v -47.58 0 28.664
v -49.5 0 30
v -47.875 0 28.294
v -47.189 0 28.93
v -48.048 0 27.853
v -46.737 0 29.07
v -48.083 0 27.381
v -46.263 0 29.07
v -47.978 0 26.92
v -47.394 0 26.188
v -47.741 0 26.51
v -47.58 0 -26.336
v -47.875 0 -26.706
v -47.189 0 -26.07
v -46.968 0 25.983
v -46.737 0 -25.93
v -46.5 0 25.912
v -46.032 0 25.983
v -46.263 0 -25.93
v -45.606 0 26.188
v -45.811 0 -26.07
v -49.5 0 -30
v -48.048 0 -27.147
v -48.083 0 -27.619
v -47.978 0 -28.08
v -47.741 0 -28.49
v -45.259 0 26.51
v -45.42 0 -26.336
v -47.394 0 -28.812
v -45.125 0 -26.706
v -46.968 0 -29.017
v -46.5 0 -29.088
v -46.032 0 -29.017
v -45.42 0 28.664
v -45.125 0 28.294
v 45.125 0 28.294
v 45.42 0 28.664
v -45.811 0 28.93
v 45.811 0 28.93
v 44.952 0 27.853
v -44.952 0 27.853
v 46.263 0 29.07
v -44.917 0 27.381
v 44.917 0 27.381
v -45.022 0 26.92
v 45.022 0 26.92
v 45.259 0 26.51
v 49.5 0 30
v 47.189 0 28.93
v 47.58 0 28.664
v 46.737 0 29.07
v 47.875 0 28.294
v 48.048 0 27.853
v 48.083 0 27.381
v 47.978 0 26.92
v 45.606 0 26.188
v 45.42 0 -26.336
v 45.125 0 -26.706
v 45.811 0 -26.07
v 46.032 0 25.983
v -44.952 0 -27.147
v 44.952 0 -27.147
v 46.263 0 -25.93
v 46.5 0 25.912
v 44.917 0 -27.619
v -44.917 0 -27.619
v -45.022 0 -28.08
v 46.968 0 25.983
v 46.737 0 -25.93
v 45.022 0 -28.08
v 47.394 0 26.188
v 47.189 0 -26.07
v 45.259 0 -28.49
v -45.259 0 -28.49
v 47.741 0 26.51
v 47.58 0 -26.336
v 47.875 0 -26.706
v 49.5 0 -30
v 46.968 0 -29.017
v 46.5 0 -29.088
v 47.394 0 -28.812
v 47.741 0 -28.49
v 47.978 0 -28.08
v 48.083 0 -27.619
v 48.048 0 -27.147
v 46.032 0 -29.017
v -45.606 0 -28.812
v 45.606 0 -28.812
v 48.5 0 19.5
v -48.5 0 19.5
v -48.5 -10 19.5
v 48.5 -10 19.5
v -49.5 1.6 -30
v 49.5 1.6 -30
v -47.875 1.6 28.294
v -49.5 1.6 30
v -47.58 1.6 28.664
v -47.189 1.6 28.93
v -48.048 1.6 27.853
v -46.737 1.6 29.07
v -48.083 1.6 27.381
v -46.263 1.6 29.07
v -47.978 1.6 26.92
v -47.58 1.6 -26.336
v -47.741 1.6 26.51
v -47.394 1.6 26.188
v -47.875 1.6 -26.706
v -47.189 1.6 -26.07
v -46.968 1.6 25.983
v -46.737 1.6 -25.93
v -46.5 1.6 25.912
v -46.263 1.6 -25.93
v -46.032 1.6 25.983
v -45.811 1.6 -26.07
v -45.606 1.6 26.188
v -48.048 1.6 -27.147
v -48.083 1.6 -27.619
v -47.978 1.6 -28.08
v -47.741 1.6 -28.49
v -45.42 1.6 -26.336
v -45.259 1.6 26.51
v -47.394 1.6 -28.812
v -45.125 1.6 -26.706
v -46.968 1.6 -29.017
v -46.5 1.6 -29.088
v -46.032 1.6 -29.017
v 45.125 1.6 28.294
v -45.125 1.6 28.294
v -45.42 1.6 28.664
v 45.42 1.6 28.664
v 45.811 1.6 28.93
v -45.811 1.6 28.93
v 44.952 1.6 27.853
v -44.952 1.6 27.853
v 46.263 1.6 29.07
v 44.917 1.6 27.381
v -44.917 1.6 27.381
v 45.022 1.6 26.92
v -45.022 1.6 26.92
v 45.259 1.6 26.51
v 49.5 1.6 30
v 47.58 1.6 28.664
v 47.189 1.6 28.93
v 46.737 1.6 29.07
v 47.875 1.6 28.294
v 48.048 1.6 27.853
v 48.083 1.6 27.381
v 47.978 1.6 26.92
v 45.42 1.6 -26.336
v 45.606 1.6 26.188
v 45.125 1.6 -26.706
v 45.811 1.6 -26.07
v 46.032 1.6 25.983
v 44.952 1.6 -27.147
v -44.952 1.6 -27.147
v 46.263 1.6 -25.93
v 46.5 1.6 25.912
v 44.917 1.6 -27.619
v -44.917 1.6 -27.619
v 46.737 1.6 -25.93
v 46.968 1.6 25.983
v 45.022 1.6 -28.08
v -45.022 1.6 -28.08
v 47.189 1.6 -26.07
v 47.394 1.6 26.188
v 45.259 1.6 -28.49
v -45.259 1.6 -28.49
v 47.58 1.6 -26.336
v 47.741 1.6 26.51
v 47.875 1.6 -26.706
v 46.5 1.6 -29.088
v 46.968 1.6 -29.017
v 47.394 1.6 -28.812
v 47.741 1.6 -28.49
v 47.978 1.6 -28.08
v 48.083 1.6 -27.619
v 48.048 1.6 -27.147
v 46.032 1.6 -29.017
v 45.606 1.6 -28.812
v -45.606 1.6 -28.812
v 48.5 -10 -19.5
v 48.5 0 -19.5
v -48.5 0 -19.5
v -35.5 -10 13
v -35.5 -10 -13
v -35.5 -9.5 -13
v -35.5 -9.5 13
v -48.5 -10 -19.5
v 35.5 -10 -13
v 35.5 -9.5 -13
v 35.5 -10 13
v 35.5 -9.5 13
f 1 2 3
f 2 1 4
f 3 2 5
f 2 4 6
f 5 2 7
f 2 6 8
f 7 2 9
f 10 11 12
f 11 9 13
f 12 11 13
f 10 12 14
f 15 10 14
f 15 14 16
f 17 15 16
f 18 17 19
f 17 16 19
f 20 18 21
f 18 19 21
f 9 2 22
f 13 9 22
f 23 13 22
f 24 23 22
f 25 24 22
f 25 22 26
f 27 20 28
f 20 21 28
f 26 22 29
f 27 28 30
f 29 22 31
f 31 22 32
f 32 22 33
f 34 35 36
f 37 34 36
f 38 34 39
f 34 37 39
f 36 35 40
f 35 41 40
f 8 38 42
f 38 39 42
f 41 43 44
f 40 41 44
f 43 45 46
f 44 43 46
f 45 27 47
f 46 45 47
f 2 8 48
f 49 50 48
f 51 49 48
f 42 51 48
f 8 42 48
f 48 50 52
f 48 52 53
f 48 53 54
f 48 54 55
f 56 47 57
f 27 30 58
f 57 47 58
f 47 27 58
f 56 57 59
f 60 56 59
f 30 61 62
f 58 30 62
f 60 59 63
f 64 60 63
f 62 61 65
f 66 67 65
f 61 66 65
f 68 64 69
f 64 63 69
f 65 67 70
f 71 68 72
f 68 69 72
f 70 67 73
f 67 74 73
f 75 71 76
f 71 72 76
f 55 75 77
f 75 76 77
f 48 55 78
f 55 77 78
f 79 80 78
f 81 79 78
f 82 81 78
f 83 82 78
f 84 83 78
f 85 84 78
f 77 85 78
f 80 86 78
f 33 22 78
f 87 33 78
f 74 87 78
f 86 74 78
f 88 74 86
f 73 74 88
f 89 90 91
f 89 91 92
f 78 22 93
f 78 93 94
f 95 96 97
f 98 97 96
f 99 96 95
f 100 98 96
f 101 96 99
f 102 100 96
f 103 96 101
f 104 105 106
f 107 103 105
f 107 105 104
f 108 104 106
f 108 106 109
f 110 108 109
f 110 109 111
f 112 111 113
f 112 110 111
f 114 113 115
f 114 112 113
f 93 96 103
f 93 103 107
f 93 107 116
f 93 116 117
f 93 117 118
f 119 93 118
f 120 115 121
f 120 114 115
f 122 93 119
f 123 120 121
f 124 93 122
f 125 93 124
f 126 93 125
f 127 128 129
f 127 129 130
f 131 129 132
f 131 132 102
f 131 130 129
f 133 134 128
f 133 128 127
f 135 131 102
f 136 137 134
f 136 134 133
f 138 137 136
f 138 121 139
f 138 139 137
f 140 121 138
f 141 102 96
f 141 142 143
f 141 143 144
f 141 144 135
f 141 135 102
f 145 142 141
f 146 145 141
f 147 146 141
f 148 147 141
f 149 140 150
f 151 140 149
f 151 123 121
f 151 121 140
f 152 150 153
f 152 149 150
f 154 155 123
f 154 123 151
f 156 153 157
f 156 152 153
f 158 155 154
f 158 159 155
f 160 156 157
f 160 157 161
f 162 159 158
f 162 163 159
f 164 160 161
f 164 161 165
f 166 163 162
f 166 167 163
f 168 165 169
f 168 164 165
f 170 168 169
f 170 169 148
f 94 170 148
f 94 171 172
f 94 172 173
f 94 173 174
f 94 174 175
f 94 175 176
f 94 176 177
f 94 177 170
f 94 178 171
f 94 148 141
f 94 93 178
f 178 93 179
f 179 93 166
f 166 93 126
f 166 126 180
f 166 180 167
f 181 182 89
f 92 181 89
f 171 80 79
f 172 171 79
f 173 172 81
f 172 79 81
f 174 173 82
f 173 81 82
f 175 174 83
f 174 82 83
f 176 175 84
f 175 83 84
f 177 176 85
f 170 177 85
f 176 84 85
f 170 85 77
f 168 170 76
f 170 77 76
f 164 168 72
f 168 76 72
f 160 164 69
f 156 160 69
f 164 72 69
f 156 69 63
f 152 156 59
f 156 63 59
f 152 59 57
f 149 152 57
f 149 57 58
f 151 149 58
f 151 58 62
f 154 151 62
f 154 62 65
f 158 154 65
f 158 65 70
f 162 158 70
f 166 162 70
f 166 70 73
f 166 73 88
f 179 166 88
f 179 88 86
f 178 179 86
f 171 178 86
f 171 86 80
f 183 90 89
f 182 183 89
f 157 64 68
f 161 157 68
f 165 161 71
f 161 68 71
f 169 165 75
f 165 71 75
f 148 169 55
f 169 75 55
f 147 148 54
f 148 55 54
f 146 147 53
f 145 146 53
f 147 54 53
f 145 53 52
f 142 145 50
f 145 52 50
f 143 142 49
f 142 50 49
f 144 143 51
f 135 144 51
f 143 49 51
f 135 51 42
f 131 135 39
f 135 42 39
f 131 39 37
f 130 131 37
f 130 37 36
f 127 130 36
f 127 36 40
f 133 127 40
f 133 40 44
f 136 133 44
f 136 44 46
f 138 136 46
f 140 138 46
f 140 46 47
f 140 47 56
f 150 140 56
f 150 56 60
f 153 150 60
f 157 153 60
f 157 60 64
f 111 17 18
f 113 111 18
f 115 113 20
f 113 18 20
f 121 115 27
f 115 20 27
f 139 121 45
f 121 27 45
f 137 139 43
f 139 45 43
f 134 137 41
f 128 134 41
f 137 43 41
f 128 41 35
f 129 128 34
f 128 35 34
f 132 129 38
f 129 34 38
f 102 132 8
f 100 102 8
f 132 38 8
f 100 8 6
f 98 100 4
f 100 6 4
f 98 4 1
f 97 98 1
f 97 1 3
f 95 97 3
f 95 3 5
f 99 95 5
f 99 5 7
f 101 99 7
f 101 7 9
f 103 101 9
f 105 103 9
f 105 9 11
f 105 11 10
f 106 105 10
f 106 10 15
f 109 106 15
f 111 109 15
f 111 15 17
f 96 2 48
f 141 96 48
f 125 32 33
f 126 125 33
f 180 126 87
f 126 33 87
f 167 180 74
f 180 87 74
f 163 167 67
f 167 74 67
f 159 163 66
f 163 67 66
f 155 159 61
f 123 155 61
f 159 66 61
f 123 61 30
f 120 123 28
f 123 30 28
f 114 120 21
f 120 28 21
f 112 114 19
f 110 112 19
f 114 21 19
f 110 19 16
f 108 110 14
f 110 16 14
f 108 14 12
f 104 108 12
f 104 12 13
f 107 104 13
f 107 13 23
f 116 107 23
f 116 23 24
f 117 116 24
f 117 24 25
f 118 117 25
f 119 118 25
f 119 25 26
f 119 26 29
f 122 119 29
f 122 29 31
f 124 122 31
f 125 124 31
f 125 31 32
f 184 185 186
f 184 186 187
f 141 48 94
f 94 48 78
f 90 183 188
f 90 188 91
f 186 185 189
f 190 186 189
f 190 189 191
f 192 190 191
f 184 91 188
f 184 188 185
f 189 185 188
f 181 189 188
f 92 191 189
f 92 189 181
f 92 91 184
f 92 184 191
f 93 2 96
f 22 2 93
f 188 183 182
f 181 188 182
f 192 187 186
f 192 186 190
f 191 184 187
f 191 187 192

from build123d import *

# Parameters (mm, degrees)
SKETCH1_W           = 99
SKETCH1_H           = 60
BOSS_EXTRUDE1_DEPTH = 1.6
SKETCH2_R           = 1.5875
CUT_EXTRUDE1_DEPTH  = 58.903454128
SKETCH3_W           = 97
SKETCH3_H           = 39
BOSS_EXTRUDE2_DEPTH = 10
SKETCH4_W           = 71
SKETCH4_H           = 26
CUT_EXTRUDE2_DEPTH  = 0.5


with BuildPart() as part:
    # Sketch1 → Boss-Extrude1 (new body)
    with BuildSketch(Plane(origin=(0, 0, 0), x_dir=(1, 0, 0), z_dir=(0, 1, 0))):
        Rectangle(SKETCH1_W, SKETCH1_H)
    extrude(amount=BOSS_EXTRUDE1_DEPTH)

    # Sketch2 → Cut-Extrude1 (cut, through all)
    with BuildSketch(Plane.XZ):
        with Locations(Location((-46.5, 27.5, 0), (0, 0, 270))):
            Circle(SKETCH2_R)
        with Locations(Location((46.5, 27.5, 0), (0, 0, 270))):
            Circle(SKETCH2_R)
        with Locations(Location((46.5, -27.5, 0), (0, 0, 270))):
            Circle(SKETCH2_R)
        with Locations(Location((-46.5, -27.5, 0), (0, 0, 270))):
            Circle(SKETCH2_R)
    extrude(amount=-CUT_EXTRUDE1_DEPTH, mode=Mode.SUBTRACT)


with BuildPart() as body_2:
    # Sketch3 → Boss-Extrude2 (new body)
    with BuildSketch(Plane.XZ):
        Rectangle(SKETCH3_W, SKETCH3_H)
    extrude(amount=BOSS_EXTRUDE2_DEPTH)

    # Sketch4 → Cut-Extrude2 (cut)
    with BuildSketch(Plane.XZ.offset(10)):
        Rectangle(SKETCH4_W, SKETCH4_H)
    extrude(amount=-CUT_EXTRUDE2_DEPTH, mode=Mode.SUBTRACT)


solid = Compound([part.part, body_2.part])
